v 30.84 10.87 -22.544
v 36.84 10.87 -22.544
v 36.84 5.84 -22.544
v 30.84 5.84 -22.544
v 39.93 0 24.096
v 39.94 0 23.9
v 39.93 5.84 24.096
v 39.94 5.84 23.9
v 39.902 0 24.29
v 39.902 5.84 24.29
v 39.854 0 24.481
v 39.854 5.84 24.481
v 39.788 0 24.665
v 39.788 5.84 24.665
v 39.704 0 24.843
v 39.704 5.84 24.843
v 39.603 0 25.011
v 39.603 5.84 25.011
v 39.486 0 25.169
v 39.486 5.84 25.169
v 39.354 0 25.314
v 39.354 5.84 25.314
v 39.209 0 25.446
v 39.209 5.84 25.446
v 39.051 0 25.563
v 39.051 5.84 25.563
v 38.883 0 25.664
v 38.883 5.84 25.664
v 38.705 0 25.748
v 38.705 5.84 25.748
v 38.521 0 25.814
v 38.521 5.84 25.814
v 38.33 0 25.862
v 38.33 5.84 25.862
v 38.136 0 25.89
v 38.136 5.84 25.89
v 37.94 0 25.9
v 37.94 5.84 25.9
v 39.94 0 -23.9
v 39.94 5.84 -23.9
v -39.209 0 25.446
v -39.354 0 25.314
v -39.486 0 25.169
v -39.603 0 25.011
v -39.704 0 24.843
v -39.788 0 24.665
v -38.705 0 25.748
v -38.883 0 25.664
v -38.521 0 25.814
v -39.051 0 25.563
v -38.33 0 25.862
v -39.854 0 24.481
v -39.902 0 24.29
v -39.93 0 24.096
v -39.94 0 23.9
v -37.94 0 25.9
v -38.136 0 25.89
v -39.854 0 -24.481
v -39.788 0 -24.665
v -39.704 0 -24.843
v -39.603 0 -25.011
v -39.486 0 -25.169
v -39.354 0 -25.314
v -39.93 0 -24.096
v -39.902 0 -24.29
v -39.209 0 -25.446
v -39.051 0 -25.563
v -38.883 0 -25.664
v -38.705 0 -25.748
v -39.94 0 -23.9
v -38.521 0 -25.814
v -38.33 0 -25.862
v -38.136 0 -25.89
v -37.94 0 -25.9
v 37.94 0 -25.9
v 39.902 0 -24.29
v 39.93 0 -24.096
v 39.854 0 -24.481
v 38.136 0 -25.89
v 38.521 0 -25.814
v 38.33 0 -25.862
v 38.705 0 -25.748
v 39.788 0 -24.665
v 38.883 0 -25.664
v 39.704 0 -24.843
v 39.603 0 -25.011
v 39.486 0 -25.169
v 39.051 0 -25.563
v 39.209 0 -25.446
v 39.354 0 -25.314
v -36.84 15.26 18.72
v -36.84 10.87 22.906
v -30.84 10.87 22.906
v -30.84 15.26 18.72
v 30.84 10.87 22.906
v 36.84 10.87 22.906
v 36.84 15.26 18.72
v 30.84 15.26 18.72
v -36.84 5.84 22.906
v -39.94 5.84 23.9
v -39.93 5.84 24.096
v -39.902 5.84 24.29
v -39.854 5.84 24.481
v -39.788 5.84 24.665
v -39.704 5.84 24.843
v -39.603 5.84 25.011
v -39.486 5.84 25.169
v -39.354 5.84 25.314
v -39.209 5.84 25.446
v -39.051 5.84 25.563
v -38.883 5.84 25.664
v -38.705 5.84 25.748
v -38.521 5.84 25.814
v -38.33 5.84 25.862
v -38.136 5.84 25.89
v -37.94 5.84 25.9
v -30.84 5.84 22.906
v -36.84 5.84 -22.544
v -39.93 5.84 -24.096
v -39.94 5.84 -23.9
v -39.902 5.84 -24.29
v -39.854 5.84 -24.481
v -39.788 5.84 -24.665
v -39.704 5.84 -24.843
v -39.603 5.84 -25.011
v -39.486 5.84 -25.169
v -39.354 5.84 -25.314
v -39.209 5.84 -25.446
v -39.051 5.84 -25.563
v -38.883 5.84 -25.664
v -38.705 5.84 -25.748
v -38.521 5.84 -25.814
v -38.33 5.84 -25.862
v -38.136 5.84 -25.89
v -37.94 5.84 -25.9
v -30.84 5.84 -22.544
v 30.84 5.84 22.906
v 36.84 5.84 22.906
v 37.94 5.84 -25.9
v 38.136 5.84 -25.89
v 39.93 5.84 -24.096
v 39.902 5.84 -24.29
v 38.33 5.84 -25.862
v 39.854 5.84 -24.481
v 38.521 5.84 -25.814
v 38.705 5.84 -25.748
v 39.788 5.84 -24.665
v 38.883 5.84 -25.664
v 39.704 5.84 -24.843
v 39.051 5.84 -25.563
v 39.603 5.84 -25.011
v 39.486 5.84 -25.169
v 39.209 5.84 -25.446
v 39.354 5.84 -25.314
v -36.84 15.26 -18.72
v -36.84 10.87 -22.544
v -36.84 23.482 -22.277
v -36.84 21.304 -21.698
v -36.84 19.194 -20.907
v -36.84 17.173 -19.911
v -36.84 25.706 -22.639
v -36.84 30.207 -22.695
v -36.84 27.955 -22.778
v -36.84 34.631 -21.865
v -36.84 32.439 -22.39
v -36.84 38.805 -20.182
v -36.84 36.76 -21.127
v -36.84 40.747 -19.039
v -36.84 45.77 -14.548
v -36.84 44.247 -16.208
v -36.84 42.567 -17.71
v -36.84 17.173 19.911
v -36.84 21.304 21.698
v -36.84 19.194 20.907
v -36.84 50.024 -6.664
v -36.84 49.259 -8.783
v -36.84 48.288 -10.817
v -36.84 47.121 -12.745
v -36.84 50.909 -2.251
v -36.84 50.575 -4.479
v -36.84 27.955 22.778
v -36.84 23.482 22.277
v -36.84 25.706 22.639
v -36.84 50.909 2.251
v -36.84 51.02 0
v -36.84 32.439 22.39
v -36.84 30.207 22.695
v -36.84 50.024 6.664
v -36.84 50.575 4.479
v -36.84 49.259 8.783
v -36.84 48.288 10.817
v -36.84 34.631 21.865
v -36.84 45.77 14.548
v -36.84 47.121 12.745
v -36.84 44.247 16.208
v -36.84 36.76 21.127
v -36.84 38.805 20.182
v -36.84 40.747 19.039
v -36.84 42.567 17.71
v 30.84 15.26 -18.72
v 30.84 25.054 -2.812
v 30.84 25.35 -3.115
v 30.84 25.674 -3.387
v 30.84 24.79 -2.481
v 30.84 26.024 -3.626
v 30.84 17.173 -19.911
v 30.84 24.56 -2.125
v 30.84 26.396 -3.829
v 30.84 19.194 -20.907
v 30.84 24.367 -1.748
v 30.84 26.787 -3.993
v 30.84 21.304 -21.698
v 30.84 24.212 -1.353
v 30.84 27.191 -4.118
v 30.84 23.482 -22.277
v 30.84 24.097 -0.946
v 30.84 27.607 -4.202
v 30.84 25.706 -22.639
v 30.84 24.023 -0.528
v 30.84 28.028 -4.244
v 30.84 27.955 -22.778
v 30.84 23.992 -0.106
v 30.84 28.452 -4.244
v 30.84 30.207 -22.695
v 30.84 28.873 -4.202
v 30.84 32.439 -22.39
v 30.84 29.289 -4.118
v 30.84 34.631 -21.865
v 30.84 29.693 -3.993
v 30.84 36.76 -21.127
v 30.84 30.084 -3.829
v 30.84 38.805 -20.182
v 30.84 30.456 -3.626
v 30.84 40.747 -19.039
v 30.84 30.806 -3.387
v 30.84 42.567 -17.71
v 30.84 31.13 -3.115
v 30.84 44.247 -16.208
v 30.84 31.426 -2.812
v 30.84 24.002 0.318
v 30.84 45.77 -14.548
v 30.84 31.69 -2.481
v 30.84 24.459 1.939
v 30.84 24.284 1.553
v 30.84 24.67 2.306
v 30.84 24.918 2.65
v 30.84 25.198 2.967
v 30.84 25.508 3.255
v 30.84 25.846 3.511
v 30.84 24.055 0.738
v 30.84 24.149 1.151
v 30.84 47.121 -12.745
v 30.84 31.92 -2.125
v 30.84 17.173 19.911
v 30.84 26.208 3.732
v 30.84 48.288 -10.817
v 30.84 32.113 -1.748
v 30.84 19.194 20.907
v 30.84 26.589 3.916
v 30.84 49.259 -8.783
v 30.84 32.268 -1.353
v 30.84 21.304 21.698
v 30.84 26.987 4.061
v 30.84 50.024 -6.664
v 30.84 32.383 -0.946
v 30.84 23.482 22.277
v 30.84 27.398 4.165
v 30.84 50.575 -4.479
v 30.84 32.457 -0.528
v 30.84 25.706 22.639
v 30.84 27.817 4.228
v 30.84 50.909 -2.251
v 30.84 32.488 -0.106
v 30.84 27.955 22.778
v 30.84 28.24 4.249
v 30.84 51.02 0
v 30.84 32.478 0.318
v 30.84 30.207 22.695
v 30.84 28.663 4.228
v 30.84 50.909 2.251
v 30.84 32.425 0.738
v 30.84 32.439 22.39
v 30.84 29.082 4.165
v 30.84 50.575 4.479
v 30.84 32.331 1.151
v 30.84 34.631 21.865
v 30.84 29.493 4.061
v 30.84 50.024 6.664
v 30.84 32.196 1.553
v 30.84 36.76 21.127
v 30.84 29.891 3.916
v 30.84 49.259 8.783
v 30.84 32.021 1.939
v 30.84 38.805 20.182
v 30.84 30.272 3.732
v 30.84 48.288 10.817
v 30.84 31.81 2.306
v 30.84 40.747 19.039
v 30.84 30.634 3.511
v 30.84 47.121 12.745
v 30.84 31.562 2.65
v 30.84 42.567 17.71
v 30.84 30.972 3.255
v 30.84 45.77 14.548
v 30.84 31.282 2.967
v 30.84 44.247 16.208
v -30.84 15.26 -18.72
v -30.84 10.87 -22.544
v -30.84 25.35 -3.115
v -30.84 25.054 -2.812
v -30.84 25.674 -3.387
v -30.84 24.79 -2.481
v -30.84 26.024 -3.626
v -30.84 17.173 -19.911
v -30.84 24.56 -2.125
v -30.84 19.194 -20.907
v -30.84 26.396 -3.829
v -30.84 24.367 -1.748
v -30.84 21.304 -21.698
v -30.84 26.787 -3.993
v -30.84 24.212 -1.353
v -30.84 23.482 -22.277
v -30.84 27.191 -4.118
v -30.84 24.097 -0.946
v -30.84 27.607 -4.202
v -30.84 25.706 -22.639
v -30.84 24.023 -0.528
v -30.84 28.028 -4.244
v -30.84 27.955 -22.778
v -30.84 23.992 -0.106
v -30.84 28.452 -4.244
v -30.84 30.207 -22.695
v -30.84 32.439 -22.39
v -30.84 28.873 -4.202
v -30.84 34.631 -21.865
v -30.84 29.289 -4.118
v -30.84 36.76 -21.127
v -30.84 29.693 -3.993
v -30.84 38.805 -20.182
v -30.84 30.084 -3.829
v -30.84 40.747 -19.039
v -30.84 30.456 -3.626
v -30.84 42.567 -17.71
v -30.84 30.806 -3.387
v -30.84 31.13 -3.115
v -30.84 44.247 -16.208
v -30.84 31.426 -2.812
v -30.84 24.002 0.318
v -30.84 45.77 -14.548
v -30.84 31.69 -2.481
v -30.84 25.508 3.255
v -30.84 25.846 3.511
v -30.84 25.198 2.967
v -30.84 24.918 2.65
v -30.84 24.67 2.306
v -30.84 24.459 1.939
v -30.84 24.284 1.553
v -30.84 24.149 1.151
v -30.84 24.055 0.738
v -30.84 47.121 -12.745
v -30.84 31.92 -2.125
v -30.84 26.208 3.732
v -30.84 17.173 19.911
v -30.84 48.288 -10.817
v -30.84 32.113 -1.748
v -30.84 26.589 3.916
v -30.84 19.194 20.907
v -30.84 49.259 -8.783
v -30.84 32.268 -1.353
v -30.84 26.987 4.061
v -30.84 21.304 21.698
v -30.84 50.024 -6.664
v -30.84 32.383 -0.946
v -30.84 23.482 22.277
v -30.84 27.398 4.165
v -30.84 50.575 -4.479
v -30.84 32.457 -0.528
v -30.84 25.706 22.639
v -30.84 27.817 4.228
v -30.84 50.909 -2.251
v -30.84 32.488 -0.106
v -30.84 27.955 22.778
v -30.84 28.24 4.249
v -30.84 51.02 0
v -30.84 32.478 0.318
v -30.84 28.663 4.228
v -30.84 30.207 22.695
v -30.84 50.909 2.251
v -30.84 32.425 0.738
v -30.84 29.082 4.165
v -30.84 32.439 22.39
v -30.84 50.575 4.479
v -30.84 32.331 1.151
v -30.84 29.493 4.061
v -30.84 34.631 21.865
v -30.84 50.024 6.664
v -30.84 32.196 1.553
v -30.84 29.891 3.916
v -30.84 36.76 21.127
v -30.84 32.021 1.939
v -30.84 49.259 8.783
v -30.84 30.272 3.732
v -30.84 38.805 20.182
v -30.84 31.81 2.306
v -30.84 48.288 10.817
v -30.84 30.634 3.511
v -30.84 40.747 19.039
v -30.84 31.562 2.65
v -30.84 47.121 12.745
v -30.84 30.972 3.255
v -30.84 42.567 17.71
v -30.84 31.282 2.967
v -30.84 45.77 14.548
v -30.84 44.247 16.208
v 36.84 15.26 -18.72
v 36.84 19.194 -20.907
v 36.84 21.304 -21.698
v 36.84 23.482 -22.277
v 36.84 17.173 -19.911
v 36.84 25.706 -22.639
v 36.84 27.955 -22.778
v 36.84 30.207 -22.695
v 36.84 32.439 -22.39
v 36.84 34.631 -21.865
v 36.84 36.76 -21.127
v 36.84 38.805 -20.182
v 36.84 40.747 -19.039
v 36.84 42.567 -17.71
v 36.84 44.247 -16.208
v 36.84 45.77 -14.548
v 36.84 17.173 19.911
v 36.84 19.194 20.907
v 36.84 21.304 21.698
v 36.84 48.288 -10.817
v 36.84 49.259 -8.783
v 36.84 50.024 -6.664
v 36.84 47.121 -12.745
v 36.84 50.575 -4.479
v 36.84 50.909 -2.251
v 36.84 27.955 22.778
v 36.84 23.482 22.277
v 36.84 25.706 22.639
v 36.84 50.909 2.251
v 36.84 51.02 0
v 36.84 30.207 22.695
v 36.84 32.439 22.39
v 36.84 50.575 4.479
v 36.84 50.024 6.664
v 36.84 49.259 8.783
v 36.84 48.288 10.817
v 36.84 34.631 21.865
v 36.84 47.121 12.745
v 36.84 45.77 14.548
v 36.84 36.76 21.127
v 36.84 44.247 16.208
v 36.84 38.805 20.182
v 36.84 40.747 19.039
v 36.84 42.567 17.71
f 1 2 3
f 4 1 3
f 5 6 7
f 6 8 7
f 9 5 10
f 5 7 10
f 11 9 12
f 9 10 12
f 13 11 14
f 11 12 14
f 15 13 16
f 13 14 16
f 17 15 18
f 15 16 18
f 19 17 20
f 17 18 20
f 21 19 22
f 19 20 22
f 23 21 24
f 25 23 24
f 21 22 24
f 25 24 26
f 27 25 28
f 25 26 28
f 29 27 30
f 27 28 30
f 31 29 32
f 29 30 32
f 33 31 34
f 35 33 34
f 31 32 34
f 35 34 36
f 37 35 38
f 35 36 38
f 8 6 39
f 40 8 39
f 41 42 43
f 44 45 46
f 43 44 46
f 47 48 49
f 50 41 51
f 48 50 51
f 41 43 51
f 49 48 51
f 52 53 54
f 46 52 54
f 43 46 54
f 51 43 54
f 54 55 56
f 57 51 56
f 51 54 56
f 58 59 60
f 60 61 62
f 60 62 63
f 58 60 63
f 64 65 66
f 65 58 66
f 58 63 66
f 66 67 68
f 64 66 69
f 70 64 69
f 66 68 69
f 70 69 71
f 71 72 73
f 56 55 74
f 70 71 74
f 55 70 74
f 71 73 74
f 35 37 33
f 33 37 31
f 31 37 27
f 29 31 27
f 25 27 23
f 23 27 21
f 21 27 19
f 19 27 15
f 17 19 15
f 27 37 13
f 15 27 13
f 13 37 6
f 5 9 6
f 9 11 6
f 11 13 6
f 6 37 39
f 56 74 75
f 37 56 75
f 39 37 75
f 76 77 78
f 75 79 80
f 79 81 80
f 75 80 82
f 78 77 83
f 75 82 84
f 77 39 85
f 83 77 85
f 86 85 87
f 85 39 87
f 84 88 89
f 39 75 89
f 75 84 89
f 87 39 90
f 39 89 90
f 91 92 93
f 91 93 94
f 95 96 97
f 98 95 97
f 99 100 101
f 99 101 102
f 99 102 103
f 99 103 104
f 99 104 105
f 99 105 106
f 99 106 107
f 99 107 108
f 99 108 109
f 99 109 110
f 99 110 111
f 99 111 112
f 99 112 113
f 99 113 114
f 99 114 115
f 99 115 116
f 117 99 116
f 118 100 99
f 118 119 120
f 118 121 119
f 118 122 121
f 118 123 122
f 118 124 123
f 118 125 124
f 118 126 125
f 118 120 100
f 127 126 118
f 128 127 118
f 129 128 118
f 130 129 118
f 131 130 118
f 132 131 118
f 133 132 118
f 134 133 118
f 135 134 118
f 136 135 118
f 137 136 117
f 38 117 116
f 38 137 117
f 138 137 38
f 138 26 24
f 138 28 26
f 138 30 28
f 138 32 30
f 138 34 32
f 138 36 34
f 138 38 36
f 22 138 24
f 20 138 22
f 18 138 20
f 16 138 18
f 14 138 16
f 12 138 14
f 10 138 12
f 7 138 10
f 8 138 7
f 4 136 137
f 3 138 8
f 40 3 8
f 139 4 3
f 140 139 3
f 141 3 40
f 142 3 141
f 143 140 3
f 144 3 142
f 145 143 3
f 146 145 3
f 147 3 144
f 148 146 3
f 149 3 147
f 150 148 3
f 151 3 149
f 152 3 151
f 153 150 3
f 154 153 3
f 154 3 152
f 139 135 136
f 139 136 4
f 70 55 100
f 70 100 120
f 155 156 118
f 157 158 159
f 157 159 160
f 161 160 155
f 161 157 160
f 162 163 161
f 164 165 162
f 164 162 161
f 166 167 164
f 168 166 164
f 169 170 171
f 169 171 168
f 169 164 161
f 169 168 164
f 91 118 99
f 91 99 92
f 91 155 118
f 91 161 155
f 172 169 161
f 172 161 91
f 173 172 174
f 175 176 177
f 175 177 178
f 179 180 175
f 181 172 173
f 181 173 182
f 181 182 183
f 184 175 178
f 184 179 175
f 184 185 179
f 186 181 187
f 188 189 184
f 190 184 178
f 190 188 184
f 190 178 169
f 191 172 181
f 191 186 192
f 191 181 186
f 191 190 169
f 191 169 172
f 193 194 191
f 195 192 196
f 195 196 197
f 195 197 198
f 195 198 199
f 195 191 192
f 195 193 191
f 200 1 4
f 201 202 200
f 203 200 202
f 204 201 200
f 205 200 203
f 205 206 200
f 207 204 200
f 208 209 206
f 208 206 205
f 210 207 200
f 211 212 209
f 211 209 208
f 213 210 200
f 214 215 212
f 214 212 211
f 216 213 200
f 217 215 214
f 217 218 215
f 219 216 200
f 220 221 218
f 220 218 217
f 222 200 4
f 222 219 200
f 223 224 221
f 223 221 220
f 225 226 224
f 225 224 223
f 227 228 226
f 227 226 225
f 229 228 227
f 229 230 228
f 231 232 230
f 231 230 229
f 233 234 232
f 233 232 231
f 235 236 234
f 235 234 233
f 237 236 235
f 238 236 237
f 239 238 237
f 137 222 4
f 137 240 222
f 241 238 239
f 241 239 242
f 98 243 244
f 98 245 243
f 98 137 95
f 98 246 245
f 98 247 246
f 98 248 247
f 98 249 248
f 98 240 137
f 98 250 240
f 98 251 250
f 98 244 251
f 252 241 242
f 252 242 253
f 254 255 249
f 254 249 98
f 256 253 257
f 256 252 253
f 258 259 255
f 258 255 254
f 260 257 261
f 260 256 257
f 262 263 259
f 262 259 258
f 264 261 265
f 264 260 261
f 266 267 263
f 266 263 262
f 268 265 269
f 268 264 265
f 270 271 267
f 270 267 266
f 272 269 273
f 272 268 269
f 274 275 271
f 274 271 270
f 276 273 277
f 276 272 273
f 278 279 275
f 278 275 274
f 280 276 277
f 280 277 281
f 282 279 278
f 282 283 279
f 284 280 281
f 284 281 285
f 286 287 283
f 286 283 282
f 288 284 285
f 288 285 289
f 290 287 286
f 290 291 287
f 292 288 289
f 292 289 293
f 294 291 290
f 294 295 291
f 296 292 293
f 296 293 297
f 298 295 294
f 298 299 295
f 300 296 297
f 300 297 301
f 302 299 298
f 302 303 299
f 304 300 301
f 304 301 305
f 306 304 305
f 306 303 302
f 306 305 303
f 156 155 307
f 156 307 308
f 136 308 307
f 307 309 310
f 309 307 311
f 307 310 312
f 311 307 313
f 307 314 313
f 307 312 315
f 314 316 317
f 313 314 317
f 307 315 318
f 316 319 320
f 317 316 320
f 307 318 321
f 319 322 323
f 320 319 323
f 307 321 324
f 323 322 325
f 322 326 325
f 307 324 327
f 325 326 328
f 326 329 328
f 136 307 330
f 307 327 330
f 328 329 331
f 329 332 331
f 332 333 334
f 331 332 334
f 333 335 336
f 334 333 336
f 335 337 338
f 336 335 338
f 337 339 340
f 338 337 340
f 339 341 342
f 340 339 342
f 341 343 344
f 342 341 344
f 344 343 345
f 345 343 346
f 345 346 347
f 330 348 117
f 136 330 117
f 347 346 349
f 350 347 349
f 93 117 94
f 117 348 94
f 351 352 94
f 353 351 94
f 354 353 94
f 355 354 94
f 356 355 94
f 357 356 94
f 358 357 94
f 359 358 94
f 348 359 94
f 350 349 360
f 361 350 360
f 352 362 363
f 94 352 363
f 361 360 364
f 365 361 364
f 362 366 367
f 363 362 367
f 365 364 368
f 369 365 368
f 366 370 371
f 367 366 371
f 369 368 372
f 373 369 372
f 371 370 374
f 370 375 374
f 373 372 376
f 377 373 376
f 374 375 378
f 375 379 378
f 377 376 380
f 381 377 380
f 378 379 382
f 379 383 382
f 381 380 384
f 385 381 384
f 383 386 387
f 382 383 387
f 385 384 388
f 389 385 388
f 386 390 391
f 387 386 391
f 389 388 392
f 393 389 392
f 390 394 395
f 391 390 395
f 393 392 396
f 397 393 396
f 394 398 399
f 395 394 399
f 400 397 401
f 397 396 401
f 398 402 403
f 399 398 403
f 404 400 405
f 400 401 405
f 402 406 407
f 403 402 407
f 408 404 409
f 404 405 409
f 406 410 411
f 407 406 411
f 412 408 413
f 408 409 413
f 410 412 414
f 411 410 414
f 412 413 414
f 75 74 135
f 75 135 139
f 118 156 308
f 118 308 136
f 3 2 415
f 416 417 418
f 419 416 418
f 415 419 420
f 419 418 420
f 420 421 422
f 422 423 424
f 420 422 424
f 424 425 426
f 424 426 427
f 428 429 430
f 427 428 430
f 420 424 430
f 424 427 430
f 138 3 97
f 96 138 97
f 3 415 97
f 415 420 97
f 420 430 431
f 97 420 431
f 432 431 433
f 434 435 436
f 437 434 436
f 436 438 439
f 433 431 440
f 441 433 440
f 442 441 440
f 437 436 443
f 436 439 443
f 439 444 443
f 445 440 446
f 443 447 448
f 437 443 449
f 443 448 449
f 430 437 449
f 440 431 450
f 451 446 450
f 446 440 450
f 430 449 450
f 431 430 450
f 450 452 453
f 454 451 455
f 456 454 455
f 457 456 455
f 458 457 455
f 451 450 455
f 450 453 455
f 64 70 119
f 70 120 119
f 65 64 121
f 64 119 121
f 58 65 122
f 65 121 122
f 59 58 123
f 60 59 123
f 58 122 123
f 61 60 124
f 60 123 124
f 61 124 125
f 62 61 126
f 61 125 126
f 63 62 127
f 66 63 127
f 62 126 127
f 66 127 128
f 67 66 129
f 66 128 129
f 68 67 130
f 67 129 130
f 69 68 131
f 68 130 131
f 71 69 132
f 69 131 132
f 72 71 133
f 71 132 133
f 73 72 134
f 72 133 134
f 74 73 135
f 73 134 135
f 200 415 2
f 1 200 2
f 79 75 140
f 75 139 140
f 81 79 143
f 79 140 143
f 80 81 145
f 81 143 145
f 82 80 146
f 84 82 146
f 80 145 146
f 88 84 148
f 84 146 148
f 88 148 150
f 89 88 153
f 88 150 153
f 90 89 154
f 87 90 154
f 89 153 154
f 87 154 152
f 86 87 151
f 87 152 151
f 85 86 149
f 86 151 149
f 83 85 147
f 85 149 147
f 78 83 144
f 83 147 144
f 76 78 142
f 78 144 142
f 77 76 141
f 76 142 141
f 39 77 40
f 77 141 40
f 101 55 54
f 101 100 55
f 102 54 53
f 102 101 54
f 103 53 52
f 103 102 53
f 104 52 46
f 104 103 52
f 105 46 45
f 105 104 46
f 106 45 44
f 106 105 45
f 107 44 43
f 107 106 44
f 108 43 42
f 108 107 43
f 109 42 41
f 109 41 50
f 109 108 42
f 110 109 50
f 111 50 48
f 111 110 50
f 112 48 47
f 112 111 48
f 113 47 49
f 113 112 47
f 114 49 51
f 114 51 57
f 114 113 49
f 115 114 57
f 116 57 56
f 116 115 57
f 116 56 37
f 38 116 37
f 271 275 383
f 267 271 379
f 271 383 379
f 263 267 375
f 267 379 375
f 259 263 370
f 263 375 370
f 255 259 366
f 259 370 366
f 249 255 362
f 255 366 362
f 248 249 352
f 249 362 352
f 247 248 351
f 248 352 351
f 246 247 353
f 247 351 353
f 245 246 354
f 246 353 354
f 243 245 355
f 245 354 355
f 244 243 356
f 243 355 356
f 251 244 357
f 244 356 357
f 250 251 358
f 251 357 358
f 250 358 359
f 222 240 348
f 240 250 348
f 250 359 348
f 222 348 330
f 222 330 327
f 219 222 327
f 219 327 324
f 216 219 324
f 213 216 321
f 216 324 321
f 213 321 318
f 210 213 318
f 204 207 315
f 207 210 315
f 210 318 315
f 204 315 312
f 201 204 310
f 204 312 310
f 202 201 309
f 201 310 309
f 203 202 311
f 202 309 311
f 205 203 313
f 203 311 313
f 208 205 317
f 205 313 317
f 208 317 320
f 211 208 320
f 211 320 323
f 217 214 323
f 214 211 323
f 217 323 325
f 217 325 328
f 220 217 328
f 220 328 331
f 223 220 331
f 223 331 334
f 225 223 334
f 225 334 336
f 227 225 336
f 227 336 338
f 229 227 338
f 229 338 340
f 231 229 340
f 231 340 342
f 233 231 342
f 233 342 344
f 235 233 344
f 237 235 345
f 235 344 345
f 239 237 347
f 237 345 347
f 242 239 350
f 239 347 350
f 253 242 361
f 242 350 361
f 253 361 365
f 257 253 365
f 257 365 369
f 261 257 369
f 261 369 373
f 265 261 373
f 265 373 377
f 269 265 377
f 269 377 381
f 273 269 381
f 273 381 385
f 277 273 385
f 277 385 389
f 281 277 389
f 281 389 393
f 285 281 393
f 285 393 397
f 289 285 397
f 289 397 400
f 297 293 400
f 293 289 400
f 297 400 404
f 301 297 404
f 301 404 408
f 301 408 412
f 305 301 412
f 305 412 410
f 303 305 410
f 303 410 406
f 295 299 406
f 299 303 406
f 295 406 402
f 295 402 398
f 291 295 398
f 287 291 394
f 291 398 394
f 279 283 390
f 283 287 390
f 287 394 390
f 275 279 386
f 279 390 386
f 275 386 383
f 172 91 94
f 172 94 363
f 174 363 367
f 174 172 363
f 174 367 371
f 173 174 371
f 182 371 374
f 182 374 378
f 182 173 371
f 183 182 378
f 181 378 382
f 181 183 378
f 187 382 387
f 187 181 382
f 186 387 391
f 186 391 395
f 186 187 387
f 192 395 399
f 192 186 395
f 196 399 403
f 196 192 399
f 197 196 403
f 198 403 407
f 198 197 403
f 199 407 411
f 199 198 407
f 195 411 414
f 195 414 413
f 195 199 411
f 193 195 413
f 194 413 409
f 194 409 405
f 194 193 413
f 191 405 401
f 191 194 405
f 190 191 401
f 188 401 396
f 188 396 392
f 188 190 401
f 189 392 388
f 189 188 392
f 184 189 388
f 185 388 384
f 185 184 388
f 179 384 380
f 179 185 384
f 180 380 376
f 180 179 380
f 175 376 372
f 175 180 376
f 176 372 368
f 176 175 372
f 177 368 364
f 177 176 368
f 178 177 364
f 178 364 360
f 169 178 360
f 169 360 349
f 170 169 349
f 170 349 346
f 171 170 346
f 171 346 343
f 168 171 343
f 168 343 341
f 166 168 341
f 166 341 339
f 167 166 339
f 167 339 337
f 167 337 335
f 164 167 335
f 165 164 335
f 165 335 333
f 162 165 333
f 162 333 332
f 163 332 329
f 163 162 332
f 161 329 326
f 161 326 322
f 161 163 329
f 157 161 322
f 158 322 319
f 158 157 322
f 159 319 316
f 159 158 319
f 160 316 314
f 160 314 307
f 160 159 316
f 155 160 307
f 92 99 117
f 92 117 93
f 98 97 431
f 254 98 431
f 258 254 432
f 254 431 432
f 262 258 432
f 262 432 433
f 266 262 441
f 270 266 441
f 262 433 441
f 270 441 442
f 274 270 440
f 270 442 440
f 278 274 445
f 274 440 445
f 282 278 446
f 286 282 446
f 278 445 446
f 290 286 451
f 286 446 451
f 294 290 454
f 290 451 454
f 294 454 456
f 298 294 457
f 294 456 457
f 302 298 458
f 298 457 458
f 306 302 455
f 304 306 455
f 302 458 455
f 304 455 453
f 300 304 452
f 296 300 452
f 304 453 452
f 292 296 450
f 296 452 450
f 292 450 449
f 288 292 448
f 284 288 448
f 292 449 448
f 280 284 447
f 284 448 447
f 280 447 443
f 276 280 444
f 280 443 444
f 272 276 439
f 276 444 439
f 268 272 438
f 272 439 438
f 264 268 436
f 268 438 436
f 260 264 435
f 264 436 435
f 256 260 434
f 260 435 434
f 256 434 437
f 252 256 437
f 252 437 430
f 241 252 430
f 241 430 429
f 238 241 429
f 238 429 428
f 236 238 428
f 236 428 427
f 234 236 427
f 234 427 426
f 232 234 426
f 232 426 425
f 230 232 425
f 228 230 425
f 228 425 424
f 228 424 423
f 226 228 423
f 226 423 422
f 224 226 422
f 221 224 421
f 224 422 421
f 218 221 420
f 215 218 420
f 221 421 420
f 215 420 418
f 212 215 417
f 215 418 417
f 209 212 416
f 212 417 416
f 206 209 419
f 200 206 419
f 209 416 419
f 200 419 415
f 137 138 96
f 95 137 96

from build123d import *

# Parameters (mm, degrees)
SKETCH2_W           = 79.88
SKETCH2_H           = 51.8
BOSS_EXTRUDE1_DEPTH = 5.84
FILLET2_R           = 2
FILLET3_R           = 2
FILLET4_R           = 2
BOSS_EXTRUDE3_START = -3.1
BOSS_EXTRUDE3_DEPTH = 6
FILLET6_R           = 2
BOSS_EXTRUDE5_REACH = 93.015
SKETCH10_R          = 4.249482904


with BuildPart() as part:
    # Sketch2 → Boss-Extrude1 (new body)
    with BuildSketch(Plane(origin=(0, 0, 0), x_dir=(1, 0, 0), z_dir=(0, 1, 0))):
        Rectangle(SKETCH2_W, SKETCH2_H)
    extrude(amount=BOSS_EXTRUDE1_DEPTH)

    # Fillet2
    fillet2_edges = [part.edges().sort_by_distance(p)[0] for p in [
        (-39.94, 2.92, -25.9),
    ]]
    fillet(fillet2_edges, radius=FILLET2_R)

    # Fillet3
    fillet3_edges = [part.edges().sort_by_distance(p)[0] for p in [
        (-39.94, 2.92, 25.9),
    ]]
    fillet(fillet3_edges, radius=FILLET3_R)

    # Fillet4
    fillet4_edges = [part.edges().sort_by_distance(p)[0] for p in [
        (39.94, 2.92, -25.9),
    ]]
    fillet(fillet4_edges, radius=FILLET4_R)

    # Sketch3 → Boss-Extrude3 (add)
    with BuildSketch(Plane.ZY.offset(39.94).offset(BOSS_EXTRUDE3_START)):
        with BuildLine():
            Line((-22.543575681, 5.84), (22.906424319, 5.84))
            Line((22.906424319, 5.84), (22.906424319, 10.87))
            Line((22.906424319, 10.87), (18.720256409, 15.26))
            ThreePointArc((18.720256409, 15.26), (0, 51.02), (-18.720256409, 15.26))
            Line((-18.720256409, 15.26), (-22.543575681, 10.87))
            Line((-22.543575681, 10.87), (-22.543575681, 5.84))
        make_face()
    boss_extrude3 = extrude(amount=-BOSS_EXTRUDE3_DEPTH)

    # Fillet6
    fillet6_edges = [part.edges().sort_by_distance(p)[0] for p in [
        (39.94, 2.92, 25.9),
    ]]
    fillet(fillet6_edges, radius=FILLET6_R)

    # Mirror1: Boss-Extrude3 across plane
    add(boss_extrude3.mirror(Plane(origin=(0, 0, 0), x_dir=(0, 0, 1), z_dir=(1, 0, 0))))

    # Sketch10 → Boss-Extrude5 (add, up to next)
    with BuildSketch(Plane(origin=(-30.84, 0, 0), x_dir=(0, 0, -1), z_dir=(1, 0, 0)), mode=Mode.PRIVATE) as boss_extrude5_sk1:
        with Locations(Location((0, 28.24, 0), (0, 0, 180))):
            Circle(SKETCH10_R)
    boss_extrude5_tool1 = extrude(boss_extrude5_sk1.sketch, amount=BOSS_EXTRUDE5_REACH, mode=Mode.PRIVATE) - part.part
    add(boss_extrude5_tool1.solids().sort_by_distance((-30.84, 28.24, 0))[0])


solid = part.part
